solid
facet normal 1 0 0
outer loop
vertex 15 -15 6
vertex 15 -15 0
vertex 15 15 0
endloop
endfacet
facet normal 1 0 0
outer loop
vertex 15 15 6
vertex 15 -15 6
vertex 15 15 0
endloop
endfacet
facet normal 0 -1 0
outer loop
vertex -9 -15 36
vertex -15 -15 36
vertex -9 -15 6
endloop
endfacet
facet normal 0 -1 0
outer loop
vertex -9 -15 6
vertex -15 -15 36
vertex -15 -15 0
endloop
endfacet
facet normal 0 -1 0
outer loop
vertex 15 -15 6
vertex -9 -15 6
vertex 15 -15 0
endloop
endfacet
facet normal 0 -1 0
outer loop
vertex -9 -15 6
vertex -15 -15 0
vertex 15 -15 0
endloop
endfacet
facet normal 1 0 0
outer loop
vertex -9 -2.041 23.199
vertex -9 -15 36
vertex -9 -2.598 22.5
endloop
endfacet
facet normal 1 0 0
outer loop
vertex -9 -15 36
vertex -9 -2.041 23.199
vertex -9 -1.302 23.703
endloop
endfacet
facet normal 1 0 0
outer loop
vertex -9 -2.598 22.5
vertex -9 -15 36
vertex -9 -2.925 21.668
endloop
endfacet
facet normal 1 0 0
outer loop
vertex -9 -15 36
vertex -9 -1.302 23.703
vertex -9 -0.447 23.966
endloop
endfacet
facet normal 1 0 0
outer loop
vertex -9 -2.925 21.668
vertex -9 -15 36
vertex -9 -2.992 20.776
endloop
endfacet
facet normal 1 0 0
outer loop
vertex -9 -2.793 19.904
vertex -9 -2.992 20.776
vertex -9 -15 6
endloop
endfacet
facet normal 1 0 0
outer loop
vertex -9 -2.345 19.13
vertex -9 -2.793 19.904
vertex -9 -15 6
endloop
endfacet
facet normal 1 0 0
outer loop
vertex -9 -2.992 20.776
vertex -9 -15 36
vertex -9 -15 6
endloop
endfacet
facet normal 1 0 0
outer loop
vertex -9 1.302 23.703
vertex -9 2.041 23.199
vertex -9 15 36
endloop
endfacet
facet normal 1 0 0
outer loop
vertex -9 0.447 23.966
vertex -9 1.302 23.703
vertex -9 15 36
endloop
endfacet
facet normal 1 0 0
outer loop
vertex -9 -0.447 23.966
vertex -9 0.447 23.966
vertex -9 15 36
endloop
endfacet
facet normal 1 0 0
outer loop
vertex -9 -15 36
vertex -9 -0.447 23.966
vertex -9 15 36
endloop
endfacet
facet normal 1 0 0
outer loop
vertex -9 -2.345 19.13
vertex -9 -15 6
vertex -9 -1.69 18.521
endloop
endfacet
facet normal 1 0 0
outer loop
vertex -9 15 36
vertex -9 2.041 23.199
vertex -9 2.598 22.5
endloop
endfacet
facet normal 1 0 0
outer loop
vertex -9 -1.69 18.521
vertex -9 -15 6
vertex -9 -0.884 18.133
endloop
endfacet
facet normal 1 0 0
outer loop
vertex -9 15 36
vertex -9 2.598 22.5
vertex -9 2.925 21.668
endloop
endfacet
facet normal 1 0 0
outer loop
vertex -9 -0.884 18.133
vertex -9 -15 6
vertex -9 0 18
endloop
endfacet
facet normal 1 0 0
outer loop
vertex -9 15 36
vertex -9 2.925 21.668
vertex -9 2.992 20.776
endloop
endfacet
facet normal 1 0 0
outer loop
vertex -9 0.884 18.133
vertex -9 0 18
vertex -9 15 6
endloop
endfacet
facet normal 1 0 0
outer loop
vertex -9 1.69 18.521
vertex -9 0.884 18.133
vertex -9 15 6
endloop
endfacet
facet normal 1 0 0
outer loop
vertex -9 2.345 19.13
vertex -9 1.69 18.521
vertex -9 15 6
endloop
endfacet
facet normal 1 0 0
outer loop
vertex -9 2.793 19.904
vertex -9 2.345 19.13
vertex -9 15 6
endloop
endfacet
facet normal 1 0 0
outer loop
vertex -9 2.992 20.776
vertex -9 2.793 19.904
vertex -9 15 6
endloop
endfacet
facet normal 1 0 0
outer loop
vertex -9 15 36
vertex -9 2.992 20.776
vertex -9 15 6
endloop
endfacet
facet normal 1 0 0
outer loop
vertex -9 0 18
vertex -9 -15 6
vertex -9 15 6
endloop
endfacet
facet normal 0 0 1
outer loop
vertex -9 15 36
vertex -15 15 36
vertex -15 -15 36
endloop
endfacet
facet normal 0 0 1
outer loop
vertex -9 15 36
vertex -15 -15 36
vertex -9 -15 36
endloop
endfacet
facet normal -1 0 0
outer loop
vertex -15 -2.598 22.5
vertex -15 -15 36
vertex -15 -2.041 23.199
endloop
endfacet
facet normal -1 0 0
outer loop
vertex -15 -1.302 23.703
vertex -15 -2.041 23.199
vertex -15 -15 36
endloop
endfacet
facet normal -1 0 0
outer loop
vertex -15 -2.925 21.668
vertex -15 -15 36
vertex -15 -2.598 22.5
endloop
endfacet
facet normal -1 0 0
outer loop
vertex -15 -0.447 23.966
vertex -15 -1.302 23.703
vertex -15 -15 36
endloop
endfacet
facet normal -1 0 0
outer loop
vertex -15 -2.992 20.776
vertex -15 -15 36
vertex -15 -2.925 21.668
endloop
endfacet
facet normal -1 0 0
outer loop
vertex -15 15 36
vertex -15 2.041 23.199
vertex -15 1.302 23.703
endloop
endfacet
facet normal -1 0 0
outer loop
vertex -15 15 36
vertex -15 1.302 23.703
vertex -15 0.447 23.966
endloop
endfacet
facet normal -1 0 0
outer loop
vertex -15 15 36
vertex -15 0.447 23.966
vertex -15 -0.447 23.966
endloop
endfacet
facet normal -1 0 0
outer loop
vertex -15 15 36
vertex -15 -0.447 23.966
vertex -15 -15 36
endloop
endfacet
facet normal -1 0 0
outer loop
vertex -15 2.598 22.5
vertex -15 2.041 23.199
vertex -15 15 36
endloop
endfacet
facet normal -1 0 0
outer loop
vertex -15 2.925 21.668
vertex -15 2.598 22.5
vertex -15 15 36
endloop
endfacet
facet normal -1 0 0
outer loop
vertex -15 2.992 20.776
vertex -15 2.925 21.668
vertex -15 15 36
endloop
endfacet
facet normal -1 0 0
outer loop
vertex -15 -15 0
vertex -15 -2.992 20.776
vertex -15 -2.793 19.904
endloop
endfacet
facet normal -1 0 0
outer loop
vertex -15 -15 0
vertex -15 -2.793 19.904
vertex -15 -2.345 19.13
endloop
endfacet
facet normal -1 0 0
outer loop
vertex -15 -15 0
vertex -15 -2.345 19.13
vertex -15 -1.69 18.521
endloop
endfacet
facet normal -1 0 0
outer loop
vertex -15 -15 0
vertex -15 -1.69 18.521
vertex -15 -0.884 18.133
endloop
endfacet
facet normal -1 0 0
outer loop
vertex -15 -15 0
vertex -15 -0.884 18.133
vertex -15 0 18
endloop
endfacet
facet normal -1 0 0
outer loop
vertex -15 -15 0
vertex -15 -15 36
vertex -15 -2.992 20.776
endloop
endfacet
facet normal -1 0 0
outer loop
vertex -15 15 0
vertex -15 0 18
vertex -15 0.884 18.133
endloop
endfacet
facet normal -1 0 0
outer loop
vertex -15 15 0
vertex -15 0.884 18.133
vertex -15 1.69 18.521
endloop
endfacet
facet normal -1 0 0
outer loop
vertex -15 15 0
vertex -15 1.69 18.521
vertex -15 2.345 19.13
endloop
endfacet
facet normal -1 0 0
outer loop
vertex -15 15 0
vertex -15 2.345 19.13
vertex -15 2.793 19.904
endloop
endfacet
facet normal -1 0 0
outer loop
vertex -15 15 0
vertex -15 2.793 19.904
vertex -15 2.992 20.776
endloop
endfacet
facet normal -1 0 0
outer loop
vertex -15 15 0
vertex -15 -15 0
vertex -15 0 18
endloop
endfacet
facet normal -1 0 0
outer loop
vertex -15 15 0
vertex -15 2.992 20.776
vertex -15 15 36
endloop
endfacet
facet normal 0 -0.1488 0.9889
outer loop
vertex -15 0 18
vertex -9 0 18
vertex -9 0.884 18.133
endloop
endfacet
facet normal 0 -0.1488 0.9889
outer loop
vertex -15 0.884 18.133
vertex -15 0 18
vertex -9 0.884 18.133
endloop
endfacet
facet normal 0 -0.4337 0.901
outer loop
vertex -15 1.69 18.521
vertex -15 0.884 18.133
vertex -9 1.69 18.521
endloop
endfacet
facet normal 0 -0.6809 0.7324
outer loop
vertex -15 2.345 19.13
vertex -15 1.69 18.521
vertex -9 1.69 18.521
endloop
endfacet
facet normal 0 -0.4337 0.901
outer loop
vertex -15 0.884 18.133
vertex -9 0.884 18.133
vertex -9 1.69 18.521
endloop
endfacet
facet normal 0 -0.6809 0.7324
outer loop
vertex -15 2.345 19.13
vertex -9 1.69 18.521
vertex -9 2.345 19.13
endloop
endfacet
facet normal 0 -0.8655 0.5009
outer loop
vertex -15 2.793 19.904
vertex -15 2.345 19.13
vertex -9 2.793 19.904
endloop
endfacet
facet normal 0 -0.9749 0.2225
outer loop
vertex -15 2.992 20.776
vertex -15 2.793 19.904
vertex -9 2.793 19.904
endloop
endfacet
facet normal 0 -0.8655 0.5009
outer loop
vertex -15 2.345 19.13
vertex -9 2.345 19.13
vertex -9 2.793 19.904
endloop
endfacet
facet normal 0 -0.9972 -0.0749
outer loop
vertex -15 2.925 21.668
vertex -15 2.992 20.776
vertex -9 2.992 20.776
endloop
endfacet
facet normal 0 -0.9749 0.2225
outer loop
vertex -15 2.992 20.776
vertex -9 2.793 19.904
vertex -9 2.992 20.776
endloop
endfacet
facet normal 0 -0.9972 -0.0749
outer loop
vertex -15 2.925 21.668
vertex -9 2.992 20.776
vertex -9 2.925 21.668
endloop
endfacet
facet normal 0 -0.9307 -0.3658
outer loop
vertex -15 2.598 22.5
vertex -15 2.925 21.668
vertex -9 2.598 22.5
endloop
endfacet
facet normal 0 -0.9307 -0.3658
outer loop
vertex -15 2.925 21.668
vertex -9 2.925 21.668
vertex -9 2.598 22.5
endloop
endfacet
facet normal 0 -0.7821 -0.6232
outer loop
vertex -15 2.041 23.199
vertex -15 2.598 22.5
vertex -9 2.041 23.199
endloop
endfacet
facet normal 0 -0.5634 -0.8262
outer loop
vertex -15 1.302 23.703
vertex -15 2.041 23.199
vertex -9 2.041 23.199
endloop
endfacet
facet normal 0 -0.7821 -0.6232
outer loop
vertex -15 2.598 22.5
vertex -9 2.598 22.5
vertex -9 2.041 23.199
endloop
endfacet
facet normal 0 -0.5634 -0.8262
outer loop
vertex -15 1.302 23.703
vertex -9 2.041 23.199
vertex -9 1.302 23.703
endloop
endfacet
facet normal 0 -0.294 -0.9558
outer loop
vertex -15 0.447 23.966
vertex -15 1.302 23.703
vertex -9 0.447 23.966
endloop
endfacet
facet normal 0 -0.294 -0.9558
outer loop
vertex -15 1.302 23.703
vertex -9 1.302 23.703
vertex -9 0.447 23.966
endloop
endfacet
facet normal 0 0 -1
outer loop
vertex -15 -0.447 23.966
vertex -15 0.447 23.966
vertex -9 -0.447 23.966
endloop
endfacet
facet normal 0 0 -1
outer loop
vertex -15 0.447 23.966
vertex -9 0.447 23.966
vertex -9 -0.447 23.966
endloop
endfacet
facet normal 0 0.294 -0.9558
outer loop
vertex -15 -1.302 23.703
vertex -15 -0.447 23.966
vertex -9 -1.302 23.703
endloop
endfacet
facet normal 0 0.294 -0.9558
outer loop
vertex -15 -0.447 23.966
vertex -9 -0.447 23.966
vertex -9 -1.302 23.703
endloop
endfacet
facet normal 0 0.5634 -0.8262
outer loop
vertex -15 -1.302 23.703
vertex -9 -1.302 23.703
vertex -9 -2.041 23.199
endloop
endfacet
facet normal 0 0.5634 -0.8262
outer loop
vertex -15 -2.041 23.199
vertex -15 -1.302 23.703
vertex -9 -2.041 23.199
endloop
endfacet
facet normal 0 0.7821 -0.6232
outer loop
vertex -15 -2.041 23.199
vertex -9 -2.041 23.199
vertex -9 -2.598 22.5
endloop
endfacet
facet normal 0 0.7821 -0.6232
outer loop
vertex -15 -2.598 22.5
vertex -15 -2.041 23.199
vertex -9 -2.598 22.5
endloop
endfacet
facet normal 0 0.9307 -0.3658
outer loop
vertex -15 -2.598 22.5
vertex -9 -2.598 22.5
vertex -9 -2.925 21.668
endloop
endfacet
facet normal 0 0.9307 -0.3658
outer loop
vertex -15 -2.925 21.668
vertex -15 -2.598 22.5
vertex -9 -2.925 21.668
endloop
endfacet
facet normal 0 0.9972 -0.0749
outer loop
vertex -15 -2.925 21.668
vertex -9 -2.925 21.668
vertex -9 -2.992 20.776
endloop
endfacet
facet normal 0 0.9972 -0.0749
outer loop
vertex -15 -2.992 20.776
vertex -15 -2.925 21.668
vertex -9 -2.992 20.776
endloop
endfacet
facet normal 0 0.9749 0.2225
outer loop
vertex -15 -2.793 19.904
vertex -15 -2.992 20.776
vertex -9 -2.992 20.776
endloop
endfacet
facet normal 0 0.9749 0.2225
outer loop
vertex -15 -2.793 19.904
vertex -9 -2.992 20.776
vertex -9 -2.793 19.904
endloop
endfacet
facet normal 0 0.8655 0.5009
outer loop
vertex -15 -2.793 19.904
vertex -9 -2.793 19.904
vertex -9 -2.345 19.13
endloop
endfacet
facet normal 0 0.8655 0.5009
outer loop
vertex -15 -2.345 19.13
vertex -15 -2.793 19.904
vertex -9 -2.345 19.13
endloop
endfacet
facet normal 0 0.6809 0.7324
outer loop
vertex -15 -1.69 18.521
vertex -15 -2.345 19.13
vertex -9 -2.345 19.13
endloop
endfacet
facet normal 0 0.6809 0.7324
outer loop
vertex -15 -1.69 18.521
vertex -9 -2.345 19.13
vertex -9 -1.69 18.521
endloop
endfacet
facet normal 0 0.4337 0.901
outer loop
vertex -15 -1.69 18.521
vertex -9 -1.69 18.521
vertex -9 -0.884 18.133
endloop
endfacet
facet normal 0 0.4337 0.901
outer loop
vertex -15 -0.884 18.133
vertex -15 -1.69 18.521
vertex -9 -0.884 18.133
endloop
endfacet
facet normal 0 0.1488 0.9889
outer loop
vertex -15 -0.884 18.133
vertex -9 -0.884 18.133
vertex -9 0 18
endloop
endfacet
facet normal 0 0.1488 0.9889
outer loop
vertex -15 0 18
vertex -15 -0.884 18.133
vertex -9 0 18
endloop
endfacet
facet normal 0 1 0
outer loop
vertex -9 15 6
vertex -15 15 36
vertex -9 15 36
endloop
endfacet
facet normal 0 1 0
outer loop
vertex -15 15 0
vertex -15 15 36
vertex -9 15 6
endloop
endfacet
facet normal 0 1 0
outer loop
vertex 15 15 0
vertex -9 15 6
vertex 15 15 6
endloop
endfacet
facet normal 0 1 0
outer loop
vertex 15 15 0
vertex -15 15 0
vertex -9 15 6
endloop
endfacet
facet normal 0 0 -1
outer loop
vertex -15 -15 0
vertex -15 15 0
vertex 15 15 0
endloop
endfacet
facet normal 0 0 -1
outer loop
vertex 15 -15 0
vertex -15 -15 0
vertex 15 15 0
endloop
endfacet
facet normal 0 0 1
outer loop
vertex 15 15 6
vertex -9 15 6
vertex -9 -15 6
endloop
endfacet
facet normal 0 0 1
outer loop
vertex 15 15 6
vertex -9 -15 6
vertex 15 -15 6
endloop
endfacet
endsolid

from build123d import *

# Parameters (mm, degrees)
SKETCH1_W           = 30
SKETCH1_H           = 30
BOSS_EXTRUDE1_DEPTH = 6
SKETCH2_W           = 6
SKETCH2_H           = 30
BOSS_EXTRUDE2_DEPTH = 30
SKETCH3_R           = 3
CUT_EXTRUDE1_DEPTH  = 46.793012567


with BuildPart() as part:
    # Sketch1 → Boss-Extrude1 (new body)
    with BuildSketch(Plane.XY):
        Rectangle(SKETCH1_W, SKETCH1_H)
    extrude(amount=BOSS_EXTRUDE1_DEPTH)

    # Sketch2 → Boss-Extrude2 (add)
    with BuildSketch(Plane.XY.offset(6)):
        with Locations((-12, 0)):
            Rectangle(SKETCH2_W, SKETCH2_H)
    extrude(amount=BOSS_EXTRUDE2_DEPTH)

    # Sketch3 → Cut-Extrude1 (cut, through all)
    with BuildSketch(Plane(origin=(-9, 0, 0), x_dir=(0, 0, -1), z_dir=(1, 0, 0))):
        with Locations((-21, 0)):
            Circle(SKETCH3_R)
    extrude(amount=-CUT_EXTRUDE1_DEPTH, mode=Mode.SUBTRACT)


solid = part.part
